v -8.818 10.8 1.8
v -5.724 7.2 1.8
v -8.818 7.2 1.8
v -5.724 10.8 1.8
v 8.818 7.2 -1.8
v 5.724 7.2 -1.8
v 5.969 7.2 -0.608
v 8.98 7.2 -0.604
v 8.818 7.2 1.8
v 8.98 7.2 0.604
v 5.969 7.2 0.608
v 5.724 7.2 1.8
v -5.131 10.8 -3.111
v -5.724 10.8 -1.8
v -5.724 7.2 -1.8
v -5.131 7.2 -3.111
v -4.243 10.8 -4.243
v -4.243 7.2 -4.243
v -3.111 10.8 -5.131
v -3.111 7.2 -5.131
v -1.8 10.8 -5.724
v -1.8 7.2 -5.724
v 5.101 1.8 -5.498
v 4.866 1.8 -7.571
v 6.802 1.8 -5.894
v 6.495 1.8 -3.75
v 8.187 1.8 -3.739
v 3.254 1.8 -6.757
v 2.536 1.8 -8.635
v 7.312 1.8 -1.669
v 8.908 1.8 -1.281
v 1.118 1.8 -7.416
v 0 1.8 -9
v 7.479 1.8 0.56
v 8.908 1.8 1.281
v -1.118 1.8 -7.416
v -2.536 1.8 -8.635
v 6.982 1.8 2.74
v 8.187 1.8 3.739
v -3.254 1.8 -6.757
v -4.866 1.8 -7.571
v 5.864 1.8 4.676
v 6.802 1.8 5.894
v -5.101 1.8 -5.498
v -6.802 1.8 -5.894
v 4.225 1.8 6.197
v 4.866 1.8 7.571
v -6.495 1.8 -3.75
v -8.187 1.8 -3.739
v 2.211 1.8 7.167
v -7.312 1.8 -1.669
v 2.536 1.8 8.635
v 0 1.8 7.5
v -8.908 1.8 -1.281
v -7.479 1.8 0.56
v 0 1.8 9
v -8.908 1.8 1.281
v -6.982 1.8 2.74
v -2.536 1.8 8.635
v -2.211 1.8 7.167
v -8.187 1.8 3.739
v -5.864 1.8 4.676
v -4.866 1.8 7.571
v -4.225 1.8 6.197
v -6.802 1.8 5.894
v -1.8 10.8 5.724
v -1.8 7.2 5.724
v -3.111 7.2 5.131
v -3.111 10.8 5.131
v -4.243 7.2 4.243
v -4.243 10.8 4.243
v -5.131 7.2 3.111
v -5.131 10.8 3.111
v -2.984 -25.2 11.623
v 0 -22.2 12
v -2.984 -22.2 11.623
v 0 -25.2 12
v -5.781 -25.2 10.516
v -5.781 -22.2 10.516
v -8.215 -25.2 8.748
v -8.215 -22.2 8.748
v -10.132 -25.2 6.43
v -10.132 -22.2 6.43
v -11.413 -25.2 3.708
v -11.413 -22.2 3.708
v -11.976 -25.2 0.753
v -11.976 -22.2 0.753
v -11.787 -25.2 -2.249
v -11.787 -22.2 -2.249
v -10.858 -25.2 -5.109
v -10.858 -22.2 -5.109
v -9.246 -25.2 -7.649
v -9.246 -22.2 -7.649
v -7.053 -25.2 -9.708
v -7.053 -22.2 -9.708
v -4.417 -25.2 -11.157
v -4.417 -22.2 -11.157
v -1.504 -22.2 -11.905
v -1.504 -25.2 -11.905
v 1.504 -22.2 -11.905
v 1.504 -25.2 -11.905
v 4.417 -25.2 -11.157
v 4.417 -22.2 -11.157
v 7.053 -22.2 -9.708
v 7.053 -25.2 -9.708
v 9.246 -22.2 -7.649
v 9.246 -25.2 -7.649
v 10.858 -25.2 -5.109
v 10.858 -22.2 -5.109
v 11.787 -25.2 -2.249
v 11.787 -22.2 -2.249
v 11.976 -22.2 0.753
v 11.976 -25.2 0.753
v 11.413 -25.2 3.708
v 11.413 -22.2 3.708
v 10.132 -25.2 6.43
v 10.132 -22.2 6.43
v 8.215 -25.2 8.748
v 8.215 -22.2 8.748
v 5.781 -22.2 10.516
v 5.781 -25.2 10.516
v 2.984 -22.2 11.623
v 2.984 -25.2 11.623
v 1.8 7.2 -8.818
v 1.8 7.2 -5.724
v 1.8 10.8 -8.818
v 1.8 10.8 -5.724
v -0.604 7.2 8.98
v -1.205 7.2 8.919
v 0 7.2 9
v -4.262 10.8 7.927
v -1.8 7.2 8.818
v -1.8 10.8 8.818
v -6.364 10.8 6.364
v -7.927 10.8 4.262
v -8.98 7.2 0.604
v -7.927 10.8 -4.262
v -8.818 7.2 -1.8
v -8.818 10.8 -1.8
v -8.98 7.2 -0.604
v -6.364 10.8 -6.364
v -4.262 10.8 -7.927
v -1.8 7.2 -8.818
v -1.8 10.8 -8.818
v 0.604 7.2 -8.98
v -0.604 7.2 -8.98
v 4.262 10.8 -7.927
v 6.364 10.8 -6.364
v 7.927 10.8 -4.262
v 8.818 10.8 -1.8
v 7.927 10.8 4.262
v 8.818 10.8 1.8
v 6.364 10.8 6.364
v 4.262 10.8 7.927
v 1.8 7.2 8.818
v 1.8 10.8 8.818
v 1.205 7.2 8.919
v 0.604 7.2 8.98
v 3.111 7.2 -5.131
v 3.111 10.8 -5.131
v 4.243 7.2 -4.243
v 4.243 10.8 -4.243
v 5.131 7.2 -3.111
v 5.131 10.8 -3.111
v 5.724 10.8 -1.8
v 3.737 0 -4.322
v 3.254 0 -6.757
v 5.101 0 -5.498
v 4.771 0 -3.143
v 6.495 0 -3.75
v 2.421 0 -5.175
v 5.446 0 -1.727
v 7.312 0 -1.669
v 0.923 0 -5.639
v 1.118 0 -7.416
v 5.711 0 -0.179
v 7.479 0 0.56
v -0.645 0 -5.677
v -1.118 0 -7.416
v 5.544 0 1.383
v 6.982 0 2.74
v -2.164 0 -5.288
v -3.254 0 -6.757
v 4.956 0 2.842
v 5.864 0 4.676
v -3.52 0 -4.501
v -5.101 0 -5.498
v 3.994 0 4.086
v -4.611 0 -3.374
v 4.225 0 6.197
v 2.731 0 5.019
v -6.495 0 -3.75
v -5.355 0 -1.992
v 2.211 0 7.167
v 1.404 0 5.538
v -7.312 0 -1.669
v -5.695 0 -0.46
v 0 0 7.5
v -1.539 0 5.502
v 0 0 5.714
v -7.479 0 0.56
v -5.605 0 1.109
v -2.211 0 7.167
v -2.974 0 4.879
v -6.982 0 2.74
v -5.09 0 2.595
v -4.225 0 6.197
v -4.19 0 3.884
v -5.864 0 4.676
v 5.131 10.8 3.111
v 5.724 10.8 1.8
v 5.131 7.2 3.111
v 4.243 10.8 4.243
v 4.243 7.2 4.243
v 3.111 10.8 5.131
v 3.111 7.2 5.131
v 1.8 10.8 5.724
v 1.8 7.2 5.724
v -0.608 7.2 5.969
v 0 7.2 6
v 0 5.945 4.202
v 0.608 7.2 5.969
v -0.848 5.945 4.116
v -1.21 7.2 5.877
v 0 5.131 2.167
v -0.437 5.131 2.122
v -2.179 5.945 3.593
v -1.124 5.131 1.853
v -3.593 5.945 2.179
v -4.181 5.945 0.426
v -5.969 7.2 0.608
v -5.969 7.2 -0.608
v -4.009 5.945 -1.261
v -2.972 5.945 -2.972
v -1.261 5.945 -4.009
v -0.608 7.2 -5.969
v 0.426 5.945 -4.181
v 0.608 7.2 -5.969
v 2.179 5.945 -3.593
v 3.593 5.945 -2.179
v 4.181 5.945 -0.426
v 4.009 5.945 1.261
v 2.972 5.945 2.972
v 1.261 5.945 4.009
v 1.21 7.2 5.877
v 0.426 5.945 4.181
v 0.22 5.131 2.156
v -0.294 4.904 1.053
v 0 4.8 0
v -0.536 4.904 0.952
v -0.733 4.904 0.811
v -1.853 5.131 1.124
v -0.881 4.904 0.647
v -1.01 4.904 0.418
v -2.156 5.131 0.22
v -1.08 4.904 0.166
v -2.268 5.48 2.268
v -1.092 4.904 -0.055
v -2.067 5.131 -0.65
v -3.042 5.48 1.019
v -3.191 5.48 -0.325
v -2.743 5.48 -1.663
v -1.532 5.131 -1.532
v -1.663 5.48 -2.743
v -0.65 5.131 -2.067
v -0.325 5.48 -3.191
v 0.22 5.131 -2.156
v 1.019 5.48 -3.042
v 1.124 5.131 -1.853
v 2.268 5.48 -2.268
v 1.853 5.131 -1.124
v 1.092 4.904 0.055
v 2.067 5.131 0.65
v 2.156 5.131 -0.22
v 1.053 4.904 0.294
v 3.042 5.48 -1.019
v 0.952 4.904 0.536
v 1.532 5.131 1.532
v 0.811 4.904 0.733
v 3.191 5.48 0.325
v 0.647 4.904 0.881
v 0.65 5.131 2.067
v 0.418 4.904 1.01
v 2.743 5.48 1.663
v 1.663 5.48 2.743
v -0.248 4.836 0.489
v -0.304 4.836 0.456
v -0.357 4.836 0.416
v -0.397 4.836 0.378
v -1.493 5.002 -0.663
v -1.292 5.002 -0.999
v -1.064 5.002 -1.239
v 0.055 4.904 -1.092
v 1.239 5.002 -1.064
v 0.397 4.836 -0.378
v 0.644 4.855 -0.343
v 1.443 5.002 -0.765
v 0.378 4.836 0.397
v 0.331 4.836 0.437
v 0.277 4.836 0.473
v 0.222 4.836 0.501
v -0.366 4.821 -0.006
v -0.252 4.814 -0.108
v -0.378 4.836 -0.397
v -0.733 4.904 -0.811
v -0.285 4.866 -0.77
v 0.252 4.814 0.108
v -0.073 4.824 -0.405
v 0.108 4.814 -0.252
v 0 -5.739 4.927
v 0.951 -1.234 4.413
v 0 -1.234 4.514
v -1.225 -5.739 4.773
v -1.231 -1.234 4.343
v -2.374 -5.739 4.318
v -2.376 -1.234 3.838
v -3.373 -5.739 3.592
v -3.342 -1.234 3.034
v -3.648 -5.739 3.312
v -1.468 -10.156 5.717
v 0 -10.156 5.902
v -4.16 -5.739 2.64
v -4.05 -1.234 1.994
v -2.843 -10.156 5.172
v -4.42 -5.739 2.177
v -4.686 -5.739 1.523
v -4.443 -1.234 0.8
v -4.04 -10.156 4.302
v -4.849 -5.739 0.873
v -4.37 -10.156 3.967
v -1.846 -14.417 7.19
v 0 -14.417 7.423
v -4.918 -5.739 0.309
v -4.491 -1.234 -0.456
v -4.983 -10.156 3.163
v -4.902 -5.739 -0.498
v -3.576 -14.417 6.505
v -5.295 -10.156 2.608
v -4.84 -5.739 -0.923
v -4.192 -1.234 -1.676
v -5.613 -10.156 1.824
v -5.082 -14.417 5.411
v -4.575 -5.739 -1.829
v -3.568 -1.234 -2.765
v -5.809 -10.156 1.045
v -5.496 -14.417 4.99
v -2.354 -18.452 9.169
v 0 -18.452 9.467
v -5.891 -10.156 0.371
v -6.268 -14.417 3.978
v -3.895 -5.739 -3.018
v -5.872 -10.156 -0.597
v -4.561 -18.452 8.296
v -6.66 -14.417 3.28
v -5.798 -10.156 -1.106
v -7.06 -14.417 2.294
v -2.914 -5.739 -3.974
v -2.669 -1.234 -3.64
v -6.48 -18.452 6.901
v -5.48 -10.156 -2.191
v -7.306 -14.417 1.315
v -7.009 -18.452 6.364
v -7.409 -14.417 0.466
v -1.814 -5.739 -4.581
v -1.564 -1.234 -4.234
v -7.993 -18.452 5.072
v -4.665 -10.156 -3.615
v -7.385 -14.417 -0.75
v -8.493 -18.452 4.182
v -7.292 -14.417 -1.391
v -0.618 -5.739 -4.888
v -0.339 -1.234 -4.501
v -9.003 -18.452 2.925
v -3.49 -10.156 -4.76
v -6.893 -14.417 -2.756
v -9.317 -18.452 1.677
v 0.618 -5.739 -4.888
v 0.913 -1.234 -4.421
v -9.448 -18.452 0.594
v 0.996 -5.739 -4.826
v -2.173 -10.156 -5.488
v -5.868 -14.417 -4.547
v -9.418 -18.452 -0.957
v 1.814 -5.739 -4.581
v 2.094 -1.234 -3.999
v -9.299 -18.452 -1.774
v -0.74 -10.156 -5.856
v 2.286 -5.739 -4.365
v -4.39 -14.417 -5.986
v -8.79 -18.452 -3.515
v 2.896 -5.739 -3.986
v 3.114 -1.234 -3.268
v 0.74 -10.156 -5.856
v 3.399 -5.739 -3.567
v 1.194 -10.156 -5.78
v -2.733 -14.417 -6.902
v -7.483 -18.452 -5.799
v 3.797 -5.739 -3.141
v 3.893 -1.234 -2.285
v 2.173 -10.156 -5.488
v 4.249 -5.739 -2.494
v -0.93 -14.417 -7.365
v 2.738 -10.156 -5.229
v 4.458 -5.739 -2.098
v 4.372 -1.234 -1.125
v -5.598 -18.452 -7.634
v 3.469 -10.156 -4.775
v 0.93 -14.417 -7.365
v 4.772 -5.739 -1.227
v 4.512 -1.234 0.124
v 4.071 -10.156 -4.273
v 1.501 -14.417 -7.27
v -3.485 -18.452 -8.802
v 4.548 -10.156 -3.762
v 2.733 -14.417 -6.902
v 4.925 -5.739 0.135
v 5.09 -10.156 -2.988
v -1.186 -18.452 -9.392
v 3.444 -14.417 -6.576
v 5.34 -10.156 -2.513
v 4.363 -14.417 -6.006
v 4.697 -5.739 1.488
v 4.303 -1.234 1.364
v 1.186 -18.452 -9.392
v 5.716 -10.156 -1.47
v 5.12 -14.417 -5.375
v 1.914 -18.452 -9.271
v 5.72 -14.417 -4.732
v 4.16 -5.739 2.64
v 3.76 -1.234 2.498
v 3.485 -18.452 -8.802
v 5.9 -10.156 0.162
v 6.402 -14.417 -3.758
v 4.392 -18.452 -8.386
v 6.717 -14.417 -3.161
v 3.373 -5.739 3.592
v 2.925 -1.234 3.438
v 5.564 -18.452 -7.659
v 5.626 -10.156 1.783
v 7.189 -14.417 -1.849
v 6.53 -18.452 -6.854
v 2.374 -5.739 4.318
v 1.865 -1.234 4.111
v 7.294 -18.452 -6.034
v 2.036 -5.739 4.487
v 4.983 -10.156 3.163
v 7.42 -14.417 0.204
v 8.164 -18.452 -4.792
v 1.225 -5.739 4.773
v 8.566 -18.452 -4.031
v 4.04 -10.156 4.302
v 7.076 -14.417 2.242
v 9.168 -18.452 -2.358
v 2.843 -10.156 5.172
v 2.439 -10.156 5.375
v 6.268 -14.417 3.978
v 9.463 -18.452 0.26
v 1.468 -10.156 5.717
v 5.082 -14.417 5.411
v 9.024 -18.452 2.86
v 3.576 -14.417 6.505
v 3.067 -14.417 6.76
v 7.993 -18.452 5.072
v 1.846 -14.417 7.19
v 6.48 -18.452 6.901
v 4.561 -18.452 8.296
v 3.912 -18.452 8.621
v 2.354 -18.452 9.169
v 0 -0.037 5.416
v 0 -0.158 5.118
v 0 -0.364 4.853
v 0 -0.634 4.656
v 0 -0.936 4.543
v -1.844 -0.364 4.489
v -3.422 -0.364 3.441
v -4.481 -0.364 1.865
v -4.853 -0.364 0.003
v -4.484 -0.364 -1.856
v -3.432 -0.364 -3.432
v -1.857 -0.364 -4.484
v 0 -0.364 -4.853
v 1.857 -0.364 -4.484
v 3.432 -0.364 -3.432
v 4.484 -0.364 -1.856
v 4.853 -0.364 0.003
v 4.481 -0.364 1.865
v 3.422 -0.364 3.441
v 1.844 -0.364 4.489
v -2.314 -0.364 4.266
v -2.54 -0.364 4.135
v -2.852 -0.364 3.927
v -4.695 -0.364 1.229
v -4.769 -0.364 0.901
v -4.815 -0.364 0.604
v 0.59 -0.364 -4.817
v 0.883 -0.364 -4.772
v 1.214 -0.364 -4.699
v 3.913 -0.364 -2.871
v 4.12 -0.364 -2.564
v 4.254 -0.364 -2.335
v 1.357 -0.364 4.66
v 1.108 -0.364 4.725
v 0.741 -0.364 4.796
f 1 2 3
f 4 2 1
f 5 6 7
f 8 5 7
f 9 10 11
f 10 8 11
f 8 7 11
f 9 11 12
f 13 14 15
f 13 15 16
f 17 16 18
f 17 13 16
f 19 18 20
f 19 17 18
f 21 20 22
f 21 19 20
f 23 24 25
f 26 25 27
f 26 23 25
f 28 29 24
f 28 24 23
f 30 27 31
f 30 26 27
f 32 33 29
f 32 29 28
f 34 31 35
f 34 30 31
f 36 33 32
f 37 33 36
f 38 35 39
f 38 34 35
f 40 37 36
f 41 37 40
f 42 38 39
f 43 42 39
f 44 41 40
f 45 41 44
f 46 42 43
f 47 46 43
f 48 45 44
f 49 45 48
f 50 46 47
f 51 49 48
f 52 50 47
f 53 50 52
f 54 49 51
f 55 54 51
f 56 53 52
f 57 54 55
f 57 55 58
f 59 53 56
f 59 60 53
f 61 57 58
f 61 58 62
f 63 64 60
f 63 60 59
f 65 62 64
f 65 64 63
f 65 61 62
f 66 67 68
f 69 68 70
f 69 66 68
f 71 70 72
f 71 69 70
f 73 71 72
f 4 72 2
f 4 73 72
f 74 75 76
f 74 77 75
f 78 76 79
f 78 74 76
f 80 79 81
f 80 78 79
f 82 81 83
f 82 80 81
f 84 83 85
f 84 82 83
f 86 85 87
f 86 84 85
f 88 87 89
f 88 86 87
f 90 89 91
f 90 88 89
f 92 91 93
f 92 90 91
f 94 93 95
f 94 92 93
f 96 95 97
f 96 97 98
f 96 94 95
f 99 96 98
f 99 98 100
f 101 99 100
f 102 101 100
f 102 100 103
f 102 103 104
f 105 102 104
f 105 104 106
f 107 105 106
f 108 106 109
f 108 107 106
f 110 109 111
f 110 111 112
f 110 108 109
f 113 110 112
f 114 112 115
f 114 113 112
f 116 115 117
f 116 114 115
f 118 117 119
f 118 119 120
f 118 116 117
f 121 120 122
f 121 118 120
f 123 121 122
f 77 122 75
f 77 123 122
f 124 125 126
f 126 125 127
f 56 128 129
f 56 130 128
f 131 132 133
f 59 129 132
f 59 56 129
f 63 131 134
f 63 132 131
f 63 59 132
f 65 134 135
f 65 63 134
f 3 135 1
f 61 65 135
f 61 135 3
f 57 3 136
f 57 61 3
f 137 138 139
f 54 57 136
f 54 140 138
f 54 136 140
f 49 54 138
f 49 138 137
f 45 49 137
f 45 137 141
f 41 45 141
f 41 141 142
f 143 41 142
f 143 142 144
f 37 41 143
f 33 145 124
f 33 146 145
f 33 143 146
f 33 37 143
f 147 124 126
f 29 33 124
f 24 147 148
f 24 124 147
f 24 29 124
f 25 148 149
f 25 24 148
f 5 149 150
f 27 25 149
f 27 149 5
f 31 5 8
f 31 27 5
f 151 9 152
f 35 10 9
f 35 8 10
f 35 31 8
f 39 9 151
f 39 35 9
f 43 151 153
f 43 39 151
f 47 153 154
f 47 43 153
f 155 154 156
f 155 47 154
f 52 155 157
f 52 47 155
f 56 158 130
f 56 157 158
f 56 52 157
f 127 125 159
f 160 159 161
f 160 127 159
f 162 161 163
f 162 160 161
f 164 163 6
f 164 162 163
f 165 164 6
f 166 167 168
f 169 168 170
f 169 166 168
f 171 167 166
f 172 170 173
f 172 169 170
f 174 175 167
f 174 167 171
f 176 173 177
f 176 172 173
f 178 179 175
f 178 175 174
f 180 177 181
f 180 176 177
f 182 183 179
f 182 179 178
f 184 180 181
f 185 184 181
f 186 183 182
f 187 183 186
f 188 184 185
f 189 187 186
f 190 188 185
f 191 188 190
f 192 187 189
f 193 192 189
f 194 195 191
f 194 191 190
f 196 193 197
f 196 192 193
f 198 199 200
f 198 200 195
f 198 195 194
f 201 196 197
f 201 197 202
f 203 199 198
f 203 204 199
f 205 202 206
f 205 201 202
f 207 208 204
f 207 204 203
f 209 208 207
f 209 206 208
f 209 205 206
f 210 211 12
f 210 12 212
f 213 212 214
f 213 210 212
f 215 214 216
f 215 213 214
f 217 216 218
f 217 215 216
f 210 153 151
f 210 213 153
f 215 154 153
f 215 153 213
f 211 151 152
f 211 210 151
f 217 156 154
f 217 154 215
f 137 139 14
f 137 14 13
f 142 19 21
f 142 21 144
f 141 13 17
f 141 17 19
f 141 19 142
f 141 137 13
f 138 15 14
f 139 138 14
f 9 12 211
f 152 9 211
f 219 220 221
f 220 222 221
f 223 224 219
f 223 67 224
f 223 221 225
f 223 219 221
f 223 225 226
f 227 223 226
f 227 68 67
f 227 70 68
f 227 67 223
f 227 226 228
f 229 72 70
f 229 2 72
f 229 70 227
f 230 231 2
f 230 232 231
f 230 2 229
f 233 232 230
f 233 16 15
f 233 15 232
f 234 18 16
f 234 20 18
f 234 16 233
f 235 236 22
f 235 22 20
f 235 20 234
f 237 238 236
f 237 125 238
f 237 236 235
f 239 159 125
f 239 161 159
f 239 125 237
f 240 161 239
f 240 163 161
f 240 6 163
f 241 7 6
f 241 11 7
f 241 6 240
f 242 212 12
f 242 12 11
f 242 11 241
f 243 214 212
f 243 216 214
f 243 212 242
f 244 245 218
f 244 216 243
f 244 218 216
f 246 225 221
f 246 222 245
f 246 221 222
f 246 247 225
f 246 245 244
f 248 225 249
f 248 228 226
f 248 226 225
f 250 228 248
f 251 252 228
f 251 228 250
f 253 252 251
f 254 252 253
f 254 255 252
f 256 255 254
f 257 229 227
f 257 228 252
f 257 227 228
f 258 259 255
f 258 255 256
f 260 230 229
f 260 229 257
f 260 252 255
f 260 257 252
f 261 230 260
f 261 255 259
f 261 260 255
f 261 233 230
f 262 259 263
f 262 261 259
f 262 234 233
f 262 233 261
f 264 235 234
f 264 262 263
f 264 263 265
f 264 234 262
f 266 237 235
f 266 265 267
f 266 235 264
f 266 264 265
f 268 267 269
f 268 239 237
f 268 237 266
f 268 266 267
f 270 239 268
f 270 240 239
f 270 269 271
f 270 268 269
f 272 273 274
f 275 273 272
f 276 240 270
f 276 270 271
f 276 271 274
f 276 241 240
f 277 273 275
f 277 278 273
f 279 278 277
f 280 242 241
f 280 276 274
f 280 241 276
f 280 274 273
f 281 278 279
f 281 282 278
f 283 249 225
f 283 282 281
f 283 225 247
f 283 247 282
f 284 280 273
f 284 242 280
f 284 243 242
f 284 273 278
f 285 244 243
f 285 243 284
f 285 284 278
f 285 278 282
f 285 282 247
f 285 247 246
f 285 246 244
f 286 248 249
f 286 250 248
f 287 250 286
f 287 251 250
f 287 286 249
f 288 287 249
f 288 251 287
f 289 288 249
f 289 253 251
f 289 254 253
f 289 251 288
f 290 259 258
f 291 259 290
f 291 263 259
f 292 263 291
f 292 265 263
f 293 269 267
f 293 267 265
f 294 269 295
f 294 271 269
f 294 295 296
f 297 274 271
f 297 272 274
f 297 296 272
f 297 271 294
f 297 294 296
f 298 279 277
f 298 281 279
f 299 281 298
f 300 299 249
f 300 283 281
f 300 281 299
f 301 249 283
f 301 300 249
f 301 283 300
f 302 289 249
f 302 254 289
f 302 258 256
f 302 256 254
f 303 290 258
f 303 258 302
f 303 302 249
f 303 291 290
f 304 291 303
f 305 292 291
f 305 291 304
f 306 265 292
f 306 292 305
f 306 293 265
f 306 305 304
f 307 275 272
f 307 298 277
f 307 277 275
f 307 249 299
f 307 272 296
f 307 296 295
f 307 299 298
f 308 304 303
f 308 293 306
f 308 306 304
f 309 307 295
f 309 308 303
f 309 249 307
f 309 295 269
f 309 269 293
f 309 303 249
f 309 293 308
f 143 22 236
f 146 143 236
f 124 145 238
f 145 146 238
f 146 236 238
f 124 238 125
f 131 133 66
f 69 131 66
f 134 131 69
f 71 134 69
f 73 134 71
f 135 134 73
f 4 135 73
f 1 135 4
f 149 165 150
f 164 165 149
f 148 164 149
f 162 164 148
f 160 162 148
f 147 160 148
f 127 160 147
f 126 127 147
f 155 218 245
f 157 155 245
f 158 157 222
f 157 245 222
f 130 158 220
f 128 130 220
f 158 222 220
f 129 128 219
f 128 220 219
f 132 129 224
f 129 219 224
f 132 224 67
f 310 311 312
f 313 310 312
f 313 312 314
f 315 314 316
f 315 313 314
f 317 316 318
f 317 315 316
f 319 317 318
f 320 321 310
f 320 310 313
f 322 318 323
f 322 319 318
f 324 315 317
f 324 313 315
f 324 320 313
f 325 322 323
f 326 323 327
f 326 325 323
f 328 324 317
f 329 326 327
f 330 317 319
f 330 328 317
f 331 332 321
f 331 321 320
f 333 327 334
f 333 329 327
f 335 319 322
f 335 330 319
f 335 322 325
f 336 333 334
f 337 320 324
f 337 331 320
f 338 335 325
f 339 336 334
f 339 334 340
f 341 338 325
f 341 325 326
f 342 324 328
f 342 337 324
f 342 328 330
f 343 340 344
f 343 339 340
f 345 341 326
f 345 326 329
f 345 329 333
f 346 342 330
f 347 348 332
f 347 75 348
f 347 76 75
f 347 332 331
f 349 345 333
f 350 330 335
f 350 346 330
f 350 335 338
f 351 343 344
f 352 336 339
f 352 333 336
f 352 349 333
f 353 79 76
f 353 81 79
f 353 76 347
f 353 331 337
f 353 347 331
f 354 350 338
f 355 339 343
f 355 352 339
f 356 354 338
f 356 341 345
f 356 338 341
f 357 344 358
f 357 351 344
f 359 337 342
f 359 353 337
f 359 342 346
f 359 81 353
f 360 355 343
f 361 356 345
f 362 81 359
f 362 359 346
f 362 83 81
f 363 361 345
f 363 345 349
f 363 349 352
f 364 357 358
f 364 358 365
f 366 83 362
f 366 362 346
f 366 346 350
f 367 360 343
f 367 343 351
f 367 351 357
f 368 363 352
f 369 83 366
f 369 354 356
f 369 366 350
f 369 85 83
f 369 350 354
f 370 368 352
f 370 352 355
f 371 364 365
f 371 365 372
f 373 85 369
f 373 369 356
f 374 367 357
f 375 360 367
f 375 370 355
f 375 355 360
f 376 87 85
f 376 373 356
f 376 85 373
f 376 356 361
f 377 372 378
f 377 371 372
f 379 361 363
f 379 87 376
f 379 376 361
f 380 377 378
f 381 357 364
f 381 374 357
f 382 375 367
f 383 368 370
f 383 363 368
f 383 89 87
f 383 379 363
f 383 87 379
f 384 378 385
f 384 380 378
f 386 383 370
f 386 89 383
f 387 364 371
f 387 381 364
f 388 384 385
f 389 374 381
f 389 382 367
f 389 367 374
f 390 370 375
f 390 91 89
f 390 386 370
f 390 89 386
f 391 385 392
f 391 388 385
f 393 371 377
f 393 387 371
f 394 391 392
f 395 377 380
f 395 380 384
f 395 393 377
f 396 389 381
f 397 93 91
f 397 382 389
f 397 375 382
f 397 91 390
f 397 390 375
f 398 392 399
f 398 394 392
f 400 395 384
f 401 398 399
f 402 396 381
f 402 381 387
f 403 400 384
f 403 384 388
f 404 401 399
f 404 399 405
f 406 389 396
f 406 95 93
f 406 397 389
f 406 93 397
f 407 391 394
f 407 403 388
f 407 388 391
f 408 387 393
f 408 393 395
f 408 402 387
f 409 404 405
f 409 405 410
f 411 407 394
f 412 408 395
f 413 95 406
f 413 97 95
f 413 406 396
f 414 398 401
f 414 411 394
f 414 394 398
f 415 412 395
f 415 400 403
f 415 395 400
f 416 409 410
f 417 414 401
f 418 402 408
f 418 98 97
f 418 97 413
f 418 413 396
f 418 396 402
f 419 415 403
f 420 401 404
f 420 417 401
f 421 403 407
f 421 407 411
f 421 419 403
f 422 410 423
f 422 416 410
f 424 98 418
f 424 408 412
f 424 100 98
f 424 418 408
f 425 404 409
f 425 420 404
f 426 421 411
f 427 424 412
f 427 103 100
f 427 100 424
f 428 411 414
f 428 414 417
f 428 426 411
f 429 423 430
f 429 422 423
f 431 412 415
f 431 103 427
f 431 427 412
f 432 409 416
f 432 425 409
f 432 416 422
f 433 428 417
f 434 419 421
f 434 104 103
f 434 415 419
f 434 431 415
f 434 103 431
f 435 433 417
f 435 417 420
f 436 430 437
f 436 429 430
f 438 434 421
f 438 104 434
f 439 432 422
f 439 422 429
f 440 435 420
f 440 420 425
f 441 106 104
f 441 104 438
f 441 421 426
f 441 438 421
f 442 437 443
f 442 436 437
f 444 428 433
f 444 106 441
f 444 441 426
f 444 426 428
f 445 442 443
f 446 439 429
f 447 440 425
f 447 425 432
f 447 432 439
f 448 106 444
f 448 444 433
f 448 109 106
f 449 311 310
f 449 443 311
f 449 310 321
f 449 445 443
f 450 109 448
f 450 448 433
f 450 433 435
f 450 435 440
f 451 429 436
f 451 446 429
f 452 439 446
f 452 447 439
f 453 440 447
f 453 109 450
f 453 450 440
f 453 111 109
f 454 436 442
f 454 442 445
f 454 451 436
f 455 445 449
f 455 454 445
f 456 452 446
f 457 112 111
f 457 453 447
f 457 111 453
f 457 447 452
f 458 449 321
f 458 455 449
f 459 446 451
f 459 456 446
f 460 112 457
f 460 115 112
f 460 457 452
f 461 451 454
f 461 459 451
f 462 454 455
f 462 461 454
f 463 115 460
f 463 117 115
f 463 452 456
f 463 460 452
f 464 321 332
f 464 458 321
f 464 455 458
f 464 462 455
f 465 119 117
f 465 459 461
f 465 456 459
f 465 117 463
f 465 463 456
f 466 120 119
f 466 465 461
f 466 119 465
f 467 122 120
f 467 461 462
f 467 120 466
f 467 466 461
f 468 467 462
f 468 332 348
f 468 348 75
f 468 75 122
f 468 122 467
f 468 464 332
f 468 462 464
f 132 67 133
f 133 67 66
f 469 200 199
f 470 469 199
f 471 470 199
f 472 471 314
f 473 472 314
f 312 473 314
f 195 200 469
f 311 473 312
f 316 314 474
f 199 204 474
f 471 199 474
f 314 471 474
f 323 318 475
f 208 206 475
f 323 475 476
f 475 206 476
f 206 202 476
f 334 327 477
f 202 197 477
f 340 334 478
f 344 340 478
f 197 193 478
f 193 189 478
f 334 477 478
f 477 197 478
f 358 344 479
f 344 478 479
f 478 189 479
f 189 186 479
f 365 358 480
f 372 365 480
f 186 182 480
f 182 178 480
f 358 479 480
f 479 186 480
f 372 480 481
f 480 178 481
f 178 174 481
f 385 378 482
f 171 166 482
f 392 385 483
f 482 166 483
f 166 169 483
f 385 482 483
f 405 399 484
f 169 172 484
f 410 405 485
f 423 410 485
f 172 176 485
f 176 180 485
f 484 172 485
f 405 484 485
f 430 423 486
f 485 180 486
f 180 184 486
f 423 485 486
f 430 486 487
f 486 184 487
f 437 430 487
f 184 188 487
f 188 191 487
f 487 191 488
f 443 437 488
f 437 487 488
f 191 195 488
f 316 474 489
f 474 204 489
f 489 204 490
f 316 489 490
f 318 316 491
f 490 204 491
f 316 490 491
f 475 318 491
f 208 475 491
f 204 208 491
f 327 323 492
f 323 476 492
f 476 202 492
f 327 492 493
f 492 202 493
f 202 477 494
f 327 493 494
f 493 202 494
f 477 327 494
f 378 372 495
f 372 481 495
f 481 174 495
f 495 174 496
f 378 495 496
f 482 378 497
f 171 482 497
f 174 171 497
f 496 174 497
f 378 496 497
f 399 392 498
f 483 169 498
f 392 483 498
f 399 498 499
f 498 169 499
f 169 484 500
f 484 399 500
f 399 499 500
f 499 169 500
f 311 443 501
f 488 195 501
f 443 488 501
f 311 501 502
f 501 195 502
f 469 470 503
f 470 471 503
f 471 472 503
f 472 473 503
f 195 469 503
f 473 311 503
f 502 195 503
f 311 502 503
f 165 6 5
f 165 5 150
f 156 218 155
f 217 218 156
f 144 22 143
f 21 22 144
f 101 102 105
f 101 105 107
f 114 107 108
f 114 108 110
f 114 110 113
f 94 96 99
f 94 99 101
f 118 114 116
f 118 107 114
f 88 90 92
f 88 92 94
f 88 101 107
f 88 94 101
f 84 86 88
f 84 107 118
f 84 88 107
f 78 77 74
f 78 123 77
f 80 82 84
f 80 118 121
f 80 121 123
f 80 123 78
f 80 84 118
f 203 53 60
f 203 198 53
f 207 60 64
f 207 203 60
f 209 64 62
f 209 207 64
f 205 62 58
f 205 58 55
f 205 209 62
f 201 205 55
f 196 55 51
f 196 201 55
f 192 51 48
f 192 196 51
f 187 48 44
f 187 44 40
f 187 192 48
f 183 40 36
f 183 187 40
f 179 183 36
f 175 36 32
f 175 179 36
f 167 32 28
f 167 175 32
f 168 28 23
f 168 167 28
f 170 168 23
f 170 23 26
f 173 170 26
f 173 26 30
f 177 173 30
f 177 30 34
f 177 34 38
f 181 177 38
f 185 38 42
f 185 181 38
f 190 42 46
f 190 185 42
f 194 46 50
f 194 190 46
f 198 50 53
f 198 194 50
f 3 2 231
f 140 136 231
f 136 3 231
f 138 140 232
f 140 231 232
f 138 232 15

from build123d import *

# Parameters (mm, degrees)
FILLET1_R               = 2
CUT_EXTRUDE1_REACH      = 52.636
CUT_EXTRUDE1_END_RADIUS = 15
SKETCH2_W               = 6
SKETCH2_H               = 12
CIRPATTERN1_COUNT       = 4
SCALE_1_SCALE           = 0.6


with BuildPart() as part:
    # Sketch1 → Revolve1 (revolve)
    with BuildSketch(Plane.XY, mode=Mode.PRIVATE) as revolve1_sk:
        with BuildLine():
            Line((20, -37), (20, -42))
            Line((20, -42), (0, -42))
            Line((0, -42), (0, 0))
            Line((0, 0), (0, 8))
            ThreePointArc((0, 8), (5.346686076, 9.133284811), (10, 12))
            Line((10, 12), (10, 18))
            Line((10, 18), (15, 18))
            Line((15, 18), (15, 3))
            Line((15, 3), (12.5, 3))
            Line((12.5, 3), (12.5, 0))
            Line((12.5, 0), (7.5, 0))
            ThreePointArc((7.5, 0), (10.655312326, -19.545502593), (20, -37))
        make_face()
    revolve(revolve1_sk.sketch.rotate(Axis((0, 46.622291022, 0), (0, -1, 0)), 90), axis=Axis((0, 46.622291022, 0), (0, -1, 0)))

    # Fillet1
    fillet1_edges = [part.edges().sort_by_distance(p)[0] for p in [
        (0, 0, -7.5),
    ]]
    fillet(fillet1_edges, radius=FILLET1_R)

    # Cut-Extrude1: up to this cylinder (the profile starts inside it)
    cut_extrude1_end = Plane(origin=(0, 18, 0), z_dir=(0, 1, 0)) * Cylinder(CUT_EXTRUDE1_END_RADIUS, 136.272, mode=Mode.PRIVATE)
    # Sketch2 → Cut-Extrude1 (cut, up to the surface)
    with BuildSketch(Plane.XY, mode=Mode.PRIVATE) as cut_extrude1_sk1:
        with Locations((0, 18)):
            Rectangle(SKETCH2_W, SKETCH2_H)
    cut_extrude1_tool1 = extrude(cut_extrude1_sk1.sketch, amount=-CUT_EXTRUDE1_REACH, mode=Mode.PRIVATE) & cut_extrude1_end
    cut_extrude1 = cut_extrude1_tool1.solids().sort_by_distance((0, 18, 0))[0]
    add(cut_extrude1, mode=Mode.SUBTRACT)

    # CirPattern1: Cut-Extrude1 ×4 about axis
    cirpattern1_axis = Axis((0, 0, 0), (0, 1, 0))
    for i in range(1, CIRPATTERN1_COUNT):
        add(cut_extrude1.rotate(cirpattern1_axis, i * 360 / CIRPATTERN1_COUNT), mode=Mode.SUBTRACT)


with BuildPart() as part_1:
    # 缩放比例1: scaled about (0, 0, 0)
    add(part.part.scale(SCALE_1_SCALE))


solid = part_1.part
